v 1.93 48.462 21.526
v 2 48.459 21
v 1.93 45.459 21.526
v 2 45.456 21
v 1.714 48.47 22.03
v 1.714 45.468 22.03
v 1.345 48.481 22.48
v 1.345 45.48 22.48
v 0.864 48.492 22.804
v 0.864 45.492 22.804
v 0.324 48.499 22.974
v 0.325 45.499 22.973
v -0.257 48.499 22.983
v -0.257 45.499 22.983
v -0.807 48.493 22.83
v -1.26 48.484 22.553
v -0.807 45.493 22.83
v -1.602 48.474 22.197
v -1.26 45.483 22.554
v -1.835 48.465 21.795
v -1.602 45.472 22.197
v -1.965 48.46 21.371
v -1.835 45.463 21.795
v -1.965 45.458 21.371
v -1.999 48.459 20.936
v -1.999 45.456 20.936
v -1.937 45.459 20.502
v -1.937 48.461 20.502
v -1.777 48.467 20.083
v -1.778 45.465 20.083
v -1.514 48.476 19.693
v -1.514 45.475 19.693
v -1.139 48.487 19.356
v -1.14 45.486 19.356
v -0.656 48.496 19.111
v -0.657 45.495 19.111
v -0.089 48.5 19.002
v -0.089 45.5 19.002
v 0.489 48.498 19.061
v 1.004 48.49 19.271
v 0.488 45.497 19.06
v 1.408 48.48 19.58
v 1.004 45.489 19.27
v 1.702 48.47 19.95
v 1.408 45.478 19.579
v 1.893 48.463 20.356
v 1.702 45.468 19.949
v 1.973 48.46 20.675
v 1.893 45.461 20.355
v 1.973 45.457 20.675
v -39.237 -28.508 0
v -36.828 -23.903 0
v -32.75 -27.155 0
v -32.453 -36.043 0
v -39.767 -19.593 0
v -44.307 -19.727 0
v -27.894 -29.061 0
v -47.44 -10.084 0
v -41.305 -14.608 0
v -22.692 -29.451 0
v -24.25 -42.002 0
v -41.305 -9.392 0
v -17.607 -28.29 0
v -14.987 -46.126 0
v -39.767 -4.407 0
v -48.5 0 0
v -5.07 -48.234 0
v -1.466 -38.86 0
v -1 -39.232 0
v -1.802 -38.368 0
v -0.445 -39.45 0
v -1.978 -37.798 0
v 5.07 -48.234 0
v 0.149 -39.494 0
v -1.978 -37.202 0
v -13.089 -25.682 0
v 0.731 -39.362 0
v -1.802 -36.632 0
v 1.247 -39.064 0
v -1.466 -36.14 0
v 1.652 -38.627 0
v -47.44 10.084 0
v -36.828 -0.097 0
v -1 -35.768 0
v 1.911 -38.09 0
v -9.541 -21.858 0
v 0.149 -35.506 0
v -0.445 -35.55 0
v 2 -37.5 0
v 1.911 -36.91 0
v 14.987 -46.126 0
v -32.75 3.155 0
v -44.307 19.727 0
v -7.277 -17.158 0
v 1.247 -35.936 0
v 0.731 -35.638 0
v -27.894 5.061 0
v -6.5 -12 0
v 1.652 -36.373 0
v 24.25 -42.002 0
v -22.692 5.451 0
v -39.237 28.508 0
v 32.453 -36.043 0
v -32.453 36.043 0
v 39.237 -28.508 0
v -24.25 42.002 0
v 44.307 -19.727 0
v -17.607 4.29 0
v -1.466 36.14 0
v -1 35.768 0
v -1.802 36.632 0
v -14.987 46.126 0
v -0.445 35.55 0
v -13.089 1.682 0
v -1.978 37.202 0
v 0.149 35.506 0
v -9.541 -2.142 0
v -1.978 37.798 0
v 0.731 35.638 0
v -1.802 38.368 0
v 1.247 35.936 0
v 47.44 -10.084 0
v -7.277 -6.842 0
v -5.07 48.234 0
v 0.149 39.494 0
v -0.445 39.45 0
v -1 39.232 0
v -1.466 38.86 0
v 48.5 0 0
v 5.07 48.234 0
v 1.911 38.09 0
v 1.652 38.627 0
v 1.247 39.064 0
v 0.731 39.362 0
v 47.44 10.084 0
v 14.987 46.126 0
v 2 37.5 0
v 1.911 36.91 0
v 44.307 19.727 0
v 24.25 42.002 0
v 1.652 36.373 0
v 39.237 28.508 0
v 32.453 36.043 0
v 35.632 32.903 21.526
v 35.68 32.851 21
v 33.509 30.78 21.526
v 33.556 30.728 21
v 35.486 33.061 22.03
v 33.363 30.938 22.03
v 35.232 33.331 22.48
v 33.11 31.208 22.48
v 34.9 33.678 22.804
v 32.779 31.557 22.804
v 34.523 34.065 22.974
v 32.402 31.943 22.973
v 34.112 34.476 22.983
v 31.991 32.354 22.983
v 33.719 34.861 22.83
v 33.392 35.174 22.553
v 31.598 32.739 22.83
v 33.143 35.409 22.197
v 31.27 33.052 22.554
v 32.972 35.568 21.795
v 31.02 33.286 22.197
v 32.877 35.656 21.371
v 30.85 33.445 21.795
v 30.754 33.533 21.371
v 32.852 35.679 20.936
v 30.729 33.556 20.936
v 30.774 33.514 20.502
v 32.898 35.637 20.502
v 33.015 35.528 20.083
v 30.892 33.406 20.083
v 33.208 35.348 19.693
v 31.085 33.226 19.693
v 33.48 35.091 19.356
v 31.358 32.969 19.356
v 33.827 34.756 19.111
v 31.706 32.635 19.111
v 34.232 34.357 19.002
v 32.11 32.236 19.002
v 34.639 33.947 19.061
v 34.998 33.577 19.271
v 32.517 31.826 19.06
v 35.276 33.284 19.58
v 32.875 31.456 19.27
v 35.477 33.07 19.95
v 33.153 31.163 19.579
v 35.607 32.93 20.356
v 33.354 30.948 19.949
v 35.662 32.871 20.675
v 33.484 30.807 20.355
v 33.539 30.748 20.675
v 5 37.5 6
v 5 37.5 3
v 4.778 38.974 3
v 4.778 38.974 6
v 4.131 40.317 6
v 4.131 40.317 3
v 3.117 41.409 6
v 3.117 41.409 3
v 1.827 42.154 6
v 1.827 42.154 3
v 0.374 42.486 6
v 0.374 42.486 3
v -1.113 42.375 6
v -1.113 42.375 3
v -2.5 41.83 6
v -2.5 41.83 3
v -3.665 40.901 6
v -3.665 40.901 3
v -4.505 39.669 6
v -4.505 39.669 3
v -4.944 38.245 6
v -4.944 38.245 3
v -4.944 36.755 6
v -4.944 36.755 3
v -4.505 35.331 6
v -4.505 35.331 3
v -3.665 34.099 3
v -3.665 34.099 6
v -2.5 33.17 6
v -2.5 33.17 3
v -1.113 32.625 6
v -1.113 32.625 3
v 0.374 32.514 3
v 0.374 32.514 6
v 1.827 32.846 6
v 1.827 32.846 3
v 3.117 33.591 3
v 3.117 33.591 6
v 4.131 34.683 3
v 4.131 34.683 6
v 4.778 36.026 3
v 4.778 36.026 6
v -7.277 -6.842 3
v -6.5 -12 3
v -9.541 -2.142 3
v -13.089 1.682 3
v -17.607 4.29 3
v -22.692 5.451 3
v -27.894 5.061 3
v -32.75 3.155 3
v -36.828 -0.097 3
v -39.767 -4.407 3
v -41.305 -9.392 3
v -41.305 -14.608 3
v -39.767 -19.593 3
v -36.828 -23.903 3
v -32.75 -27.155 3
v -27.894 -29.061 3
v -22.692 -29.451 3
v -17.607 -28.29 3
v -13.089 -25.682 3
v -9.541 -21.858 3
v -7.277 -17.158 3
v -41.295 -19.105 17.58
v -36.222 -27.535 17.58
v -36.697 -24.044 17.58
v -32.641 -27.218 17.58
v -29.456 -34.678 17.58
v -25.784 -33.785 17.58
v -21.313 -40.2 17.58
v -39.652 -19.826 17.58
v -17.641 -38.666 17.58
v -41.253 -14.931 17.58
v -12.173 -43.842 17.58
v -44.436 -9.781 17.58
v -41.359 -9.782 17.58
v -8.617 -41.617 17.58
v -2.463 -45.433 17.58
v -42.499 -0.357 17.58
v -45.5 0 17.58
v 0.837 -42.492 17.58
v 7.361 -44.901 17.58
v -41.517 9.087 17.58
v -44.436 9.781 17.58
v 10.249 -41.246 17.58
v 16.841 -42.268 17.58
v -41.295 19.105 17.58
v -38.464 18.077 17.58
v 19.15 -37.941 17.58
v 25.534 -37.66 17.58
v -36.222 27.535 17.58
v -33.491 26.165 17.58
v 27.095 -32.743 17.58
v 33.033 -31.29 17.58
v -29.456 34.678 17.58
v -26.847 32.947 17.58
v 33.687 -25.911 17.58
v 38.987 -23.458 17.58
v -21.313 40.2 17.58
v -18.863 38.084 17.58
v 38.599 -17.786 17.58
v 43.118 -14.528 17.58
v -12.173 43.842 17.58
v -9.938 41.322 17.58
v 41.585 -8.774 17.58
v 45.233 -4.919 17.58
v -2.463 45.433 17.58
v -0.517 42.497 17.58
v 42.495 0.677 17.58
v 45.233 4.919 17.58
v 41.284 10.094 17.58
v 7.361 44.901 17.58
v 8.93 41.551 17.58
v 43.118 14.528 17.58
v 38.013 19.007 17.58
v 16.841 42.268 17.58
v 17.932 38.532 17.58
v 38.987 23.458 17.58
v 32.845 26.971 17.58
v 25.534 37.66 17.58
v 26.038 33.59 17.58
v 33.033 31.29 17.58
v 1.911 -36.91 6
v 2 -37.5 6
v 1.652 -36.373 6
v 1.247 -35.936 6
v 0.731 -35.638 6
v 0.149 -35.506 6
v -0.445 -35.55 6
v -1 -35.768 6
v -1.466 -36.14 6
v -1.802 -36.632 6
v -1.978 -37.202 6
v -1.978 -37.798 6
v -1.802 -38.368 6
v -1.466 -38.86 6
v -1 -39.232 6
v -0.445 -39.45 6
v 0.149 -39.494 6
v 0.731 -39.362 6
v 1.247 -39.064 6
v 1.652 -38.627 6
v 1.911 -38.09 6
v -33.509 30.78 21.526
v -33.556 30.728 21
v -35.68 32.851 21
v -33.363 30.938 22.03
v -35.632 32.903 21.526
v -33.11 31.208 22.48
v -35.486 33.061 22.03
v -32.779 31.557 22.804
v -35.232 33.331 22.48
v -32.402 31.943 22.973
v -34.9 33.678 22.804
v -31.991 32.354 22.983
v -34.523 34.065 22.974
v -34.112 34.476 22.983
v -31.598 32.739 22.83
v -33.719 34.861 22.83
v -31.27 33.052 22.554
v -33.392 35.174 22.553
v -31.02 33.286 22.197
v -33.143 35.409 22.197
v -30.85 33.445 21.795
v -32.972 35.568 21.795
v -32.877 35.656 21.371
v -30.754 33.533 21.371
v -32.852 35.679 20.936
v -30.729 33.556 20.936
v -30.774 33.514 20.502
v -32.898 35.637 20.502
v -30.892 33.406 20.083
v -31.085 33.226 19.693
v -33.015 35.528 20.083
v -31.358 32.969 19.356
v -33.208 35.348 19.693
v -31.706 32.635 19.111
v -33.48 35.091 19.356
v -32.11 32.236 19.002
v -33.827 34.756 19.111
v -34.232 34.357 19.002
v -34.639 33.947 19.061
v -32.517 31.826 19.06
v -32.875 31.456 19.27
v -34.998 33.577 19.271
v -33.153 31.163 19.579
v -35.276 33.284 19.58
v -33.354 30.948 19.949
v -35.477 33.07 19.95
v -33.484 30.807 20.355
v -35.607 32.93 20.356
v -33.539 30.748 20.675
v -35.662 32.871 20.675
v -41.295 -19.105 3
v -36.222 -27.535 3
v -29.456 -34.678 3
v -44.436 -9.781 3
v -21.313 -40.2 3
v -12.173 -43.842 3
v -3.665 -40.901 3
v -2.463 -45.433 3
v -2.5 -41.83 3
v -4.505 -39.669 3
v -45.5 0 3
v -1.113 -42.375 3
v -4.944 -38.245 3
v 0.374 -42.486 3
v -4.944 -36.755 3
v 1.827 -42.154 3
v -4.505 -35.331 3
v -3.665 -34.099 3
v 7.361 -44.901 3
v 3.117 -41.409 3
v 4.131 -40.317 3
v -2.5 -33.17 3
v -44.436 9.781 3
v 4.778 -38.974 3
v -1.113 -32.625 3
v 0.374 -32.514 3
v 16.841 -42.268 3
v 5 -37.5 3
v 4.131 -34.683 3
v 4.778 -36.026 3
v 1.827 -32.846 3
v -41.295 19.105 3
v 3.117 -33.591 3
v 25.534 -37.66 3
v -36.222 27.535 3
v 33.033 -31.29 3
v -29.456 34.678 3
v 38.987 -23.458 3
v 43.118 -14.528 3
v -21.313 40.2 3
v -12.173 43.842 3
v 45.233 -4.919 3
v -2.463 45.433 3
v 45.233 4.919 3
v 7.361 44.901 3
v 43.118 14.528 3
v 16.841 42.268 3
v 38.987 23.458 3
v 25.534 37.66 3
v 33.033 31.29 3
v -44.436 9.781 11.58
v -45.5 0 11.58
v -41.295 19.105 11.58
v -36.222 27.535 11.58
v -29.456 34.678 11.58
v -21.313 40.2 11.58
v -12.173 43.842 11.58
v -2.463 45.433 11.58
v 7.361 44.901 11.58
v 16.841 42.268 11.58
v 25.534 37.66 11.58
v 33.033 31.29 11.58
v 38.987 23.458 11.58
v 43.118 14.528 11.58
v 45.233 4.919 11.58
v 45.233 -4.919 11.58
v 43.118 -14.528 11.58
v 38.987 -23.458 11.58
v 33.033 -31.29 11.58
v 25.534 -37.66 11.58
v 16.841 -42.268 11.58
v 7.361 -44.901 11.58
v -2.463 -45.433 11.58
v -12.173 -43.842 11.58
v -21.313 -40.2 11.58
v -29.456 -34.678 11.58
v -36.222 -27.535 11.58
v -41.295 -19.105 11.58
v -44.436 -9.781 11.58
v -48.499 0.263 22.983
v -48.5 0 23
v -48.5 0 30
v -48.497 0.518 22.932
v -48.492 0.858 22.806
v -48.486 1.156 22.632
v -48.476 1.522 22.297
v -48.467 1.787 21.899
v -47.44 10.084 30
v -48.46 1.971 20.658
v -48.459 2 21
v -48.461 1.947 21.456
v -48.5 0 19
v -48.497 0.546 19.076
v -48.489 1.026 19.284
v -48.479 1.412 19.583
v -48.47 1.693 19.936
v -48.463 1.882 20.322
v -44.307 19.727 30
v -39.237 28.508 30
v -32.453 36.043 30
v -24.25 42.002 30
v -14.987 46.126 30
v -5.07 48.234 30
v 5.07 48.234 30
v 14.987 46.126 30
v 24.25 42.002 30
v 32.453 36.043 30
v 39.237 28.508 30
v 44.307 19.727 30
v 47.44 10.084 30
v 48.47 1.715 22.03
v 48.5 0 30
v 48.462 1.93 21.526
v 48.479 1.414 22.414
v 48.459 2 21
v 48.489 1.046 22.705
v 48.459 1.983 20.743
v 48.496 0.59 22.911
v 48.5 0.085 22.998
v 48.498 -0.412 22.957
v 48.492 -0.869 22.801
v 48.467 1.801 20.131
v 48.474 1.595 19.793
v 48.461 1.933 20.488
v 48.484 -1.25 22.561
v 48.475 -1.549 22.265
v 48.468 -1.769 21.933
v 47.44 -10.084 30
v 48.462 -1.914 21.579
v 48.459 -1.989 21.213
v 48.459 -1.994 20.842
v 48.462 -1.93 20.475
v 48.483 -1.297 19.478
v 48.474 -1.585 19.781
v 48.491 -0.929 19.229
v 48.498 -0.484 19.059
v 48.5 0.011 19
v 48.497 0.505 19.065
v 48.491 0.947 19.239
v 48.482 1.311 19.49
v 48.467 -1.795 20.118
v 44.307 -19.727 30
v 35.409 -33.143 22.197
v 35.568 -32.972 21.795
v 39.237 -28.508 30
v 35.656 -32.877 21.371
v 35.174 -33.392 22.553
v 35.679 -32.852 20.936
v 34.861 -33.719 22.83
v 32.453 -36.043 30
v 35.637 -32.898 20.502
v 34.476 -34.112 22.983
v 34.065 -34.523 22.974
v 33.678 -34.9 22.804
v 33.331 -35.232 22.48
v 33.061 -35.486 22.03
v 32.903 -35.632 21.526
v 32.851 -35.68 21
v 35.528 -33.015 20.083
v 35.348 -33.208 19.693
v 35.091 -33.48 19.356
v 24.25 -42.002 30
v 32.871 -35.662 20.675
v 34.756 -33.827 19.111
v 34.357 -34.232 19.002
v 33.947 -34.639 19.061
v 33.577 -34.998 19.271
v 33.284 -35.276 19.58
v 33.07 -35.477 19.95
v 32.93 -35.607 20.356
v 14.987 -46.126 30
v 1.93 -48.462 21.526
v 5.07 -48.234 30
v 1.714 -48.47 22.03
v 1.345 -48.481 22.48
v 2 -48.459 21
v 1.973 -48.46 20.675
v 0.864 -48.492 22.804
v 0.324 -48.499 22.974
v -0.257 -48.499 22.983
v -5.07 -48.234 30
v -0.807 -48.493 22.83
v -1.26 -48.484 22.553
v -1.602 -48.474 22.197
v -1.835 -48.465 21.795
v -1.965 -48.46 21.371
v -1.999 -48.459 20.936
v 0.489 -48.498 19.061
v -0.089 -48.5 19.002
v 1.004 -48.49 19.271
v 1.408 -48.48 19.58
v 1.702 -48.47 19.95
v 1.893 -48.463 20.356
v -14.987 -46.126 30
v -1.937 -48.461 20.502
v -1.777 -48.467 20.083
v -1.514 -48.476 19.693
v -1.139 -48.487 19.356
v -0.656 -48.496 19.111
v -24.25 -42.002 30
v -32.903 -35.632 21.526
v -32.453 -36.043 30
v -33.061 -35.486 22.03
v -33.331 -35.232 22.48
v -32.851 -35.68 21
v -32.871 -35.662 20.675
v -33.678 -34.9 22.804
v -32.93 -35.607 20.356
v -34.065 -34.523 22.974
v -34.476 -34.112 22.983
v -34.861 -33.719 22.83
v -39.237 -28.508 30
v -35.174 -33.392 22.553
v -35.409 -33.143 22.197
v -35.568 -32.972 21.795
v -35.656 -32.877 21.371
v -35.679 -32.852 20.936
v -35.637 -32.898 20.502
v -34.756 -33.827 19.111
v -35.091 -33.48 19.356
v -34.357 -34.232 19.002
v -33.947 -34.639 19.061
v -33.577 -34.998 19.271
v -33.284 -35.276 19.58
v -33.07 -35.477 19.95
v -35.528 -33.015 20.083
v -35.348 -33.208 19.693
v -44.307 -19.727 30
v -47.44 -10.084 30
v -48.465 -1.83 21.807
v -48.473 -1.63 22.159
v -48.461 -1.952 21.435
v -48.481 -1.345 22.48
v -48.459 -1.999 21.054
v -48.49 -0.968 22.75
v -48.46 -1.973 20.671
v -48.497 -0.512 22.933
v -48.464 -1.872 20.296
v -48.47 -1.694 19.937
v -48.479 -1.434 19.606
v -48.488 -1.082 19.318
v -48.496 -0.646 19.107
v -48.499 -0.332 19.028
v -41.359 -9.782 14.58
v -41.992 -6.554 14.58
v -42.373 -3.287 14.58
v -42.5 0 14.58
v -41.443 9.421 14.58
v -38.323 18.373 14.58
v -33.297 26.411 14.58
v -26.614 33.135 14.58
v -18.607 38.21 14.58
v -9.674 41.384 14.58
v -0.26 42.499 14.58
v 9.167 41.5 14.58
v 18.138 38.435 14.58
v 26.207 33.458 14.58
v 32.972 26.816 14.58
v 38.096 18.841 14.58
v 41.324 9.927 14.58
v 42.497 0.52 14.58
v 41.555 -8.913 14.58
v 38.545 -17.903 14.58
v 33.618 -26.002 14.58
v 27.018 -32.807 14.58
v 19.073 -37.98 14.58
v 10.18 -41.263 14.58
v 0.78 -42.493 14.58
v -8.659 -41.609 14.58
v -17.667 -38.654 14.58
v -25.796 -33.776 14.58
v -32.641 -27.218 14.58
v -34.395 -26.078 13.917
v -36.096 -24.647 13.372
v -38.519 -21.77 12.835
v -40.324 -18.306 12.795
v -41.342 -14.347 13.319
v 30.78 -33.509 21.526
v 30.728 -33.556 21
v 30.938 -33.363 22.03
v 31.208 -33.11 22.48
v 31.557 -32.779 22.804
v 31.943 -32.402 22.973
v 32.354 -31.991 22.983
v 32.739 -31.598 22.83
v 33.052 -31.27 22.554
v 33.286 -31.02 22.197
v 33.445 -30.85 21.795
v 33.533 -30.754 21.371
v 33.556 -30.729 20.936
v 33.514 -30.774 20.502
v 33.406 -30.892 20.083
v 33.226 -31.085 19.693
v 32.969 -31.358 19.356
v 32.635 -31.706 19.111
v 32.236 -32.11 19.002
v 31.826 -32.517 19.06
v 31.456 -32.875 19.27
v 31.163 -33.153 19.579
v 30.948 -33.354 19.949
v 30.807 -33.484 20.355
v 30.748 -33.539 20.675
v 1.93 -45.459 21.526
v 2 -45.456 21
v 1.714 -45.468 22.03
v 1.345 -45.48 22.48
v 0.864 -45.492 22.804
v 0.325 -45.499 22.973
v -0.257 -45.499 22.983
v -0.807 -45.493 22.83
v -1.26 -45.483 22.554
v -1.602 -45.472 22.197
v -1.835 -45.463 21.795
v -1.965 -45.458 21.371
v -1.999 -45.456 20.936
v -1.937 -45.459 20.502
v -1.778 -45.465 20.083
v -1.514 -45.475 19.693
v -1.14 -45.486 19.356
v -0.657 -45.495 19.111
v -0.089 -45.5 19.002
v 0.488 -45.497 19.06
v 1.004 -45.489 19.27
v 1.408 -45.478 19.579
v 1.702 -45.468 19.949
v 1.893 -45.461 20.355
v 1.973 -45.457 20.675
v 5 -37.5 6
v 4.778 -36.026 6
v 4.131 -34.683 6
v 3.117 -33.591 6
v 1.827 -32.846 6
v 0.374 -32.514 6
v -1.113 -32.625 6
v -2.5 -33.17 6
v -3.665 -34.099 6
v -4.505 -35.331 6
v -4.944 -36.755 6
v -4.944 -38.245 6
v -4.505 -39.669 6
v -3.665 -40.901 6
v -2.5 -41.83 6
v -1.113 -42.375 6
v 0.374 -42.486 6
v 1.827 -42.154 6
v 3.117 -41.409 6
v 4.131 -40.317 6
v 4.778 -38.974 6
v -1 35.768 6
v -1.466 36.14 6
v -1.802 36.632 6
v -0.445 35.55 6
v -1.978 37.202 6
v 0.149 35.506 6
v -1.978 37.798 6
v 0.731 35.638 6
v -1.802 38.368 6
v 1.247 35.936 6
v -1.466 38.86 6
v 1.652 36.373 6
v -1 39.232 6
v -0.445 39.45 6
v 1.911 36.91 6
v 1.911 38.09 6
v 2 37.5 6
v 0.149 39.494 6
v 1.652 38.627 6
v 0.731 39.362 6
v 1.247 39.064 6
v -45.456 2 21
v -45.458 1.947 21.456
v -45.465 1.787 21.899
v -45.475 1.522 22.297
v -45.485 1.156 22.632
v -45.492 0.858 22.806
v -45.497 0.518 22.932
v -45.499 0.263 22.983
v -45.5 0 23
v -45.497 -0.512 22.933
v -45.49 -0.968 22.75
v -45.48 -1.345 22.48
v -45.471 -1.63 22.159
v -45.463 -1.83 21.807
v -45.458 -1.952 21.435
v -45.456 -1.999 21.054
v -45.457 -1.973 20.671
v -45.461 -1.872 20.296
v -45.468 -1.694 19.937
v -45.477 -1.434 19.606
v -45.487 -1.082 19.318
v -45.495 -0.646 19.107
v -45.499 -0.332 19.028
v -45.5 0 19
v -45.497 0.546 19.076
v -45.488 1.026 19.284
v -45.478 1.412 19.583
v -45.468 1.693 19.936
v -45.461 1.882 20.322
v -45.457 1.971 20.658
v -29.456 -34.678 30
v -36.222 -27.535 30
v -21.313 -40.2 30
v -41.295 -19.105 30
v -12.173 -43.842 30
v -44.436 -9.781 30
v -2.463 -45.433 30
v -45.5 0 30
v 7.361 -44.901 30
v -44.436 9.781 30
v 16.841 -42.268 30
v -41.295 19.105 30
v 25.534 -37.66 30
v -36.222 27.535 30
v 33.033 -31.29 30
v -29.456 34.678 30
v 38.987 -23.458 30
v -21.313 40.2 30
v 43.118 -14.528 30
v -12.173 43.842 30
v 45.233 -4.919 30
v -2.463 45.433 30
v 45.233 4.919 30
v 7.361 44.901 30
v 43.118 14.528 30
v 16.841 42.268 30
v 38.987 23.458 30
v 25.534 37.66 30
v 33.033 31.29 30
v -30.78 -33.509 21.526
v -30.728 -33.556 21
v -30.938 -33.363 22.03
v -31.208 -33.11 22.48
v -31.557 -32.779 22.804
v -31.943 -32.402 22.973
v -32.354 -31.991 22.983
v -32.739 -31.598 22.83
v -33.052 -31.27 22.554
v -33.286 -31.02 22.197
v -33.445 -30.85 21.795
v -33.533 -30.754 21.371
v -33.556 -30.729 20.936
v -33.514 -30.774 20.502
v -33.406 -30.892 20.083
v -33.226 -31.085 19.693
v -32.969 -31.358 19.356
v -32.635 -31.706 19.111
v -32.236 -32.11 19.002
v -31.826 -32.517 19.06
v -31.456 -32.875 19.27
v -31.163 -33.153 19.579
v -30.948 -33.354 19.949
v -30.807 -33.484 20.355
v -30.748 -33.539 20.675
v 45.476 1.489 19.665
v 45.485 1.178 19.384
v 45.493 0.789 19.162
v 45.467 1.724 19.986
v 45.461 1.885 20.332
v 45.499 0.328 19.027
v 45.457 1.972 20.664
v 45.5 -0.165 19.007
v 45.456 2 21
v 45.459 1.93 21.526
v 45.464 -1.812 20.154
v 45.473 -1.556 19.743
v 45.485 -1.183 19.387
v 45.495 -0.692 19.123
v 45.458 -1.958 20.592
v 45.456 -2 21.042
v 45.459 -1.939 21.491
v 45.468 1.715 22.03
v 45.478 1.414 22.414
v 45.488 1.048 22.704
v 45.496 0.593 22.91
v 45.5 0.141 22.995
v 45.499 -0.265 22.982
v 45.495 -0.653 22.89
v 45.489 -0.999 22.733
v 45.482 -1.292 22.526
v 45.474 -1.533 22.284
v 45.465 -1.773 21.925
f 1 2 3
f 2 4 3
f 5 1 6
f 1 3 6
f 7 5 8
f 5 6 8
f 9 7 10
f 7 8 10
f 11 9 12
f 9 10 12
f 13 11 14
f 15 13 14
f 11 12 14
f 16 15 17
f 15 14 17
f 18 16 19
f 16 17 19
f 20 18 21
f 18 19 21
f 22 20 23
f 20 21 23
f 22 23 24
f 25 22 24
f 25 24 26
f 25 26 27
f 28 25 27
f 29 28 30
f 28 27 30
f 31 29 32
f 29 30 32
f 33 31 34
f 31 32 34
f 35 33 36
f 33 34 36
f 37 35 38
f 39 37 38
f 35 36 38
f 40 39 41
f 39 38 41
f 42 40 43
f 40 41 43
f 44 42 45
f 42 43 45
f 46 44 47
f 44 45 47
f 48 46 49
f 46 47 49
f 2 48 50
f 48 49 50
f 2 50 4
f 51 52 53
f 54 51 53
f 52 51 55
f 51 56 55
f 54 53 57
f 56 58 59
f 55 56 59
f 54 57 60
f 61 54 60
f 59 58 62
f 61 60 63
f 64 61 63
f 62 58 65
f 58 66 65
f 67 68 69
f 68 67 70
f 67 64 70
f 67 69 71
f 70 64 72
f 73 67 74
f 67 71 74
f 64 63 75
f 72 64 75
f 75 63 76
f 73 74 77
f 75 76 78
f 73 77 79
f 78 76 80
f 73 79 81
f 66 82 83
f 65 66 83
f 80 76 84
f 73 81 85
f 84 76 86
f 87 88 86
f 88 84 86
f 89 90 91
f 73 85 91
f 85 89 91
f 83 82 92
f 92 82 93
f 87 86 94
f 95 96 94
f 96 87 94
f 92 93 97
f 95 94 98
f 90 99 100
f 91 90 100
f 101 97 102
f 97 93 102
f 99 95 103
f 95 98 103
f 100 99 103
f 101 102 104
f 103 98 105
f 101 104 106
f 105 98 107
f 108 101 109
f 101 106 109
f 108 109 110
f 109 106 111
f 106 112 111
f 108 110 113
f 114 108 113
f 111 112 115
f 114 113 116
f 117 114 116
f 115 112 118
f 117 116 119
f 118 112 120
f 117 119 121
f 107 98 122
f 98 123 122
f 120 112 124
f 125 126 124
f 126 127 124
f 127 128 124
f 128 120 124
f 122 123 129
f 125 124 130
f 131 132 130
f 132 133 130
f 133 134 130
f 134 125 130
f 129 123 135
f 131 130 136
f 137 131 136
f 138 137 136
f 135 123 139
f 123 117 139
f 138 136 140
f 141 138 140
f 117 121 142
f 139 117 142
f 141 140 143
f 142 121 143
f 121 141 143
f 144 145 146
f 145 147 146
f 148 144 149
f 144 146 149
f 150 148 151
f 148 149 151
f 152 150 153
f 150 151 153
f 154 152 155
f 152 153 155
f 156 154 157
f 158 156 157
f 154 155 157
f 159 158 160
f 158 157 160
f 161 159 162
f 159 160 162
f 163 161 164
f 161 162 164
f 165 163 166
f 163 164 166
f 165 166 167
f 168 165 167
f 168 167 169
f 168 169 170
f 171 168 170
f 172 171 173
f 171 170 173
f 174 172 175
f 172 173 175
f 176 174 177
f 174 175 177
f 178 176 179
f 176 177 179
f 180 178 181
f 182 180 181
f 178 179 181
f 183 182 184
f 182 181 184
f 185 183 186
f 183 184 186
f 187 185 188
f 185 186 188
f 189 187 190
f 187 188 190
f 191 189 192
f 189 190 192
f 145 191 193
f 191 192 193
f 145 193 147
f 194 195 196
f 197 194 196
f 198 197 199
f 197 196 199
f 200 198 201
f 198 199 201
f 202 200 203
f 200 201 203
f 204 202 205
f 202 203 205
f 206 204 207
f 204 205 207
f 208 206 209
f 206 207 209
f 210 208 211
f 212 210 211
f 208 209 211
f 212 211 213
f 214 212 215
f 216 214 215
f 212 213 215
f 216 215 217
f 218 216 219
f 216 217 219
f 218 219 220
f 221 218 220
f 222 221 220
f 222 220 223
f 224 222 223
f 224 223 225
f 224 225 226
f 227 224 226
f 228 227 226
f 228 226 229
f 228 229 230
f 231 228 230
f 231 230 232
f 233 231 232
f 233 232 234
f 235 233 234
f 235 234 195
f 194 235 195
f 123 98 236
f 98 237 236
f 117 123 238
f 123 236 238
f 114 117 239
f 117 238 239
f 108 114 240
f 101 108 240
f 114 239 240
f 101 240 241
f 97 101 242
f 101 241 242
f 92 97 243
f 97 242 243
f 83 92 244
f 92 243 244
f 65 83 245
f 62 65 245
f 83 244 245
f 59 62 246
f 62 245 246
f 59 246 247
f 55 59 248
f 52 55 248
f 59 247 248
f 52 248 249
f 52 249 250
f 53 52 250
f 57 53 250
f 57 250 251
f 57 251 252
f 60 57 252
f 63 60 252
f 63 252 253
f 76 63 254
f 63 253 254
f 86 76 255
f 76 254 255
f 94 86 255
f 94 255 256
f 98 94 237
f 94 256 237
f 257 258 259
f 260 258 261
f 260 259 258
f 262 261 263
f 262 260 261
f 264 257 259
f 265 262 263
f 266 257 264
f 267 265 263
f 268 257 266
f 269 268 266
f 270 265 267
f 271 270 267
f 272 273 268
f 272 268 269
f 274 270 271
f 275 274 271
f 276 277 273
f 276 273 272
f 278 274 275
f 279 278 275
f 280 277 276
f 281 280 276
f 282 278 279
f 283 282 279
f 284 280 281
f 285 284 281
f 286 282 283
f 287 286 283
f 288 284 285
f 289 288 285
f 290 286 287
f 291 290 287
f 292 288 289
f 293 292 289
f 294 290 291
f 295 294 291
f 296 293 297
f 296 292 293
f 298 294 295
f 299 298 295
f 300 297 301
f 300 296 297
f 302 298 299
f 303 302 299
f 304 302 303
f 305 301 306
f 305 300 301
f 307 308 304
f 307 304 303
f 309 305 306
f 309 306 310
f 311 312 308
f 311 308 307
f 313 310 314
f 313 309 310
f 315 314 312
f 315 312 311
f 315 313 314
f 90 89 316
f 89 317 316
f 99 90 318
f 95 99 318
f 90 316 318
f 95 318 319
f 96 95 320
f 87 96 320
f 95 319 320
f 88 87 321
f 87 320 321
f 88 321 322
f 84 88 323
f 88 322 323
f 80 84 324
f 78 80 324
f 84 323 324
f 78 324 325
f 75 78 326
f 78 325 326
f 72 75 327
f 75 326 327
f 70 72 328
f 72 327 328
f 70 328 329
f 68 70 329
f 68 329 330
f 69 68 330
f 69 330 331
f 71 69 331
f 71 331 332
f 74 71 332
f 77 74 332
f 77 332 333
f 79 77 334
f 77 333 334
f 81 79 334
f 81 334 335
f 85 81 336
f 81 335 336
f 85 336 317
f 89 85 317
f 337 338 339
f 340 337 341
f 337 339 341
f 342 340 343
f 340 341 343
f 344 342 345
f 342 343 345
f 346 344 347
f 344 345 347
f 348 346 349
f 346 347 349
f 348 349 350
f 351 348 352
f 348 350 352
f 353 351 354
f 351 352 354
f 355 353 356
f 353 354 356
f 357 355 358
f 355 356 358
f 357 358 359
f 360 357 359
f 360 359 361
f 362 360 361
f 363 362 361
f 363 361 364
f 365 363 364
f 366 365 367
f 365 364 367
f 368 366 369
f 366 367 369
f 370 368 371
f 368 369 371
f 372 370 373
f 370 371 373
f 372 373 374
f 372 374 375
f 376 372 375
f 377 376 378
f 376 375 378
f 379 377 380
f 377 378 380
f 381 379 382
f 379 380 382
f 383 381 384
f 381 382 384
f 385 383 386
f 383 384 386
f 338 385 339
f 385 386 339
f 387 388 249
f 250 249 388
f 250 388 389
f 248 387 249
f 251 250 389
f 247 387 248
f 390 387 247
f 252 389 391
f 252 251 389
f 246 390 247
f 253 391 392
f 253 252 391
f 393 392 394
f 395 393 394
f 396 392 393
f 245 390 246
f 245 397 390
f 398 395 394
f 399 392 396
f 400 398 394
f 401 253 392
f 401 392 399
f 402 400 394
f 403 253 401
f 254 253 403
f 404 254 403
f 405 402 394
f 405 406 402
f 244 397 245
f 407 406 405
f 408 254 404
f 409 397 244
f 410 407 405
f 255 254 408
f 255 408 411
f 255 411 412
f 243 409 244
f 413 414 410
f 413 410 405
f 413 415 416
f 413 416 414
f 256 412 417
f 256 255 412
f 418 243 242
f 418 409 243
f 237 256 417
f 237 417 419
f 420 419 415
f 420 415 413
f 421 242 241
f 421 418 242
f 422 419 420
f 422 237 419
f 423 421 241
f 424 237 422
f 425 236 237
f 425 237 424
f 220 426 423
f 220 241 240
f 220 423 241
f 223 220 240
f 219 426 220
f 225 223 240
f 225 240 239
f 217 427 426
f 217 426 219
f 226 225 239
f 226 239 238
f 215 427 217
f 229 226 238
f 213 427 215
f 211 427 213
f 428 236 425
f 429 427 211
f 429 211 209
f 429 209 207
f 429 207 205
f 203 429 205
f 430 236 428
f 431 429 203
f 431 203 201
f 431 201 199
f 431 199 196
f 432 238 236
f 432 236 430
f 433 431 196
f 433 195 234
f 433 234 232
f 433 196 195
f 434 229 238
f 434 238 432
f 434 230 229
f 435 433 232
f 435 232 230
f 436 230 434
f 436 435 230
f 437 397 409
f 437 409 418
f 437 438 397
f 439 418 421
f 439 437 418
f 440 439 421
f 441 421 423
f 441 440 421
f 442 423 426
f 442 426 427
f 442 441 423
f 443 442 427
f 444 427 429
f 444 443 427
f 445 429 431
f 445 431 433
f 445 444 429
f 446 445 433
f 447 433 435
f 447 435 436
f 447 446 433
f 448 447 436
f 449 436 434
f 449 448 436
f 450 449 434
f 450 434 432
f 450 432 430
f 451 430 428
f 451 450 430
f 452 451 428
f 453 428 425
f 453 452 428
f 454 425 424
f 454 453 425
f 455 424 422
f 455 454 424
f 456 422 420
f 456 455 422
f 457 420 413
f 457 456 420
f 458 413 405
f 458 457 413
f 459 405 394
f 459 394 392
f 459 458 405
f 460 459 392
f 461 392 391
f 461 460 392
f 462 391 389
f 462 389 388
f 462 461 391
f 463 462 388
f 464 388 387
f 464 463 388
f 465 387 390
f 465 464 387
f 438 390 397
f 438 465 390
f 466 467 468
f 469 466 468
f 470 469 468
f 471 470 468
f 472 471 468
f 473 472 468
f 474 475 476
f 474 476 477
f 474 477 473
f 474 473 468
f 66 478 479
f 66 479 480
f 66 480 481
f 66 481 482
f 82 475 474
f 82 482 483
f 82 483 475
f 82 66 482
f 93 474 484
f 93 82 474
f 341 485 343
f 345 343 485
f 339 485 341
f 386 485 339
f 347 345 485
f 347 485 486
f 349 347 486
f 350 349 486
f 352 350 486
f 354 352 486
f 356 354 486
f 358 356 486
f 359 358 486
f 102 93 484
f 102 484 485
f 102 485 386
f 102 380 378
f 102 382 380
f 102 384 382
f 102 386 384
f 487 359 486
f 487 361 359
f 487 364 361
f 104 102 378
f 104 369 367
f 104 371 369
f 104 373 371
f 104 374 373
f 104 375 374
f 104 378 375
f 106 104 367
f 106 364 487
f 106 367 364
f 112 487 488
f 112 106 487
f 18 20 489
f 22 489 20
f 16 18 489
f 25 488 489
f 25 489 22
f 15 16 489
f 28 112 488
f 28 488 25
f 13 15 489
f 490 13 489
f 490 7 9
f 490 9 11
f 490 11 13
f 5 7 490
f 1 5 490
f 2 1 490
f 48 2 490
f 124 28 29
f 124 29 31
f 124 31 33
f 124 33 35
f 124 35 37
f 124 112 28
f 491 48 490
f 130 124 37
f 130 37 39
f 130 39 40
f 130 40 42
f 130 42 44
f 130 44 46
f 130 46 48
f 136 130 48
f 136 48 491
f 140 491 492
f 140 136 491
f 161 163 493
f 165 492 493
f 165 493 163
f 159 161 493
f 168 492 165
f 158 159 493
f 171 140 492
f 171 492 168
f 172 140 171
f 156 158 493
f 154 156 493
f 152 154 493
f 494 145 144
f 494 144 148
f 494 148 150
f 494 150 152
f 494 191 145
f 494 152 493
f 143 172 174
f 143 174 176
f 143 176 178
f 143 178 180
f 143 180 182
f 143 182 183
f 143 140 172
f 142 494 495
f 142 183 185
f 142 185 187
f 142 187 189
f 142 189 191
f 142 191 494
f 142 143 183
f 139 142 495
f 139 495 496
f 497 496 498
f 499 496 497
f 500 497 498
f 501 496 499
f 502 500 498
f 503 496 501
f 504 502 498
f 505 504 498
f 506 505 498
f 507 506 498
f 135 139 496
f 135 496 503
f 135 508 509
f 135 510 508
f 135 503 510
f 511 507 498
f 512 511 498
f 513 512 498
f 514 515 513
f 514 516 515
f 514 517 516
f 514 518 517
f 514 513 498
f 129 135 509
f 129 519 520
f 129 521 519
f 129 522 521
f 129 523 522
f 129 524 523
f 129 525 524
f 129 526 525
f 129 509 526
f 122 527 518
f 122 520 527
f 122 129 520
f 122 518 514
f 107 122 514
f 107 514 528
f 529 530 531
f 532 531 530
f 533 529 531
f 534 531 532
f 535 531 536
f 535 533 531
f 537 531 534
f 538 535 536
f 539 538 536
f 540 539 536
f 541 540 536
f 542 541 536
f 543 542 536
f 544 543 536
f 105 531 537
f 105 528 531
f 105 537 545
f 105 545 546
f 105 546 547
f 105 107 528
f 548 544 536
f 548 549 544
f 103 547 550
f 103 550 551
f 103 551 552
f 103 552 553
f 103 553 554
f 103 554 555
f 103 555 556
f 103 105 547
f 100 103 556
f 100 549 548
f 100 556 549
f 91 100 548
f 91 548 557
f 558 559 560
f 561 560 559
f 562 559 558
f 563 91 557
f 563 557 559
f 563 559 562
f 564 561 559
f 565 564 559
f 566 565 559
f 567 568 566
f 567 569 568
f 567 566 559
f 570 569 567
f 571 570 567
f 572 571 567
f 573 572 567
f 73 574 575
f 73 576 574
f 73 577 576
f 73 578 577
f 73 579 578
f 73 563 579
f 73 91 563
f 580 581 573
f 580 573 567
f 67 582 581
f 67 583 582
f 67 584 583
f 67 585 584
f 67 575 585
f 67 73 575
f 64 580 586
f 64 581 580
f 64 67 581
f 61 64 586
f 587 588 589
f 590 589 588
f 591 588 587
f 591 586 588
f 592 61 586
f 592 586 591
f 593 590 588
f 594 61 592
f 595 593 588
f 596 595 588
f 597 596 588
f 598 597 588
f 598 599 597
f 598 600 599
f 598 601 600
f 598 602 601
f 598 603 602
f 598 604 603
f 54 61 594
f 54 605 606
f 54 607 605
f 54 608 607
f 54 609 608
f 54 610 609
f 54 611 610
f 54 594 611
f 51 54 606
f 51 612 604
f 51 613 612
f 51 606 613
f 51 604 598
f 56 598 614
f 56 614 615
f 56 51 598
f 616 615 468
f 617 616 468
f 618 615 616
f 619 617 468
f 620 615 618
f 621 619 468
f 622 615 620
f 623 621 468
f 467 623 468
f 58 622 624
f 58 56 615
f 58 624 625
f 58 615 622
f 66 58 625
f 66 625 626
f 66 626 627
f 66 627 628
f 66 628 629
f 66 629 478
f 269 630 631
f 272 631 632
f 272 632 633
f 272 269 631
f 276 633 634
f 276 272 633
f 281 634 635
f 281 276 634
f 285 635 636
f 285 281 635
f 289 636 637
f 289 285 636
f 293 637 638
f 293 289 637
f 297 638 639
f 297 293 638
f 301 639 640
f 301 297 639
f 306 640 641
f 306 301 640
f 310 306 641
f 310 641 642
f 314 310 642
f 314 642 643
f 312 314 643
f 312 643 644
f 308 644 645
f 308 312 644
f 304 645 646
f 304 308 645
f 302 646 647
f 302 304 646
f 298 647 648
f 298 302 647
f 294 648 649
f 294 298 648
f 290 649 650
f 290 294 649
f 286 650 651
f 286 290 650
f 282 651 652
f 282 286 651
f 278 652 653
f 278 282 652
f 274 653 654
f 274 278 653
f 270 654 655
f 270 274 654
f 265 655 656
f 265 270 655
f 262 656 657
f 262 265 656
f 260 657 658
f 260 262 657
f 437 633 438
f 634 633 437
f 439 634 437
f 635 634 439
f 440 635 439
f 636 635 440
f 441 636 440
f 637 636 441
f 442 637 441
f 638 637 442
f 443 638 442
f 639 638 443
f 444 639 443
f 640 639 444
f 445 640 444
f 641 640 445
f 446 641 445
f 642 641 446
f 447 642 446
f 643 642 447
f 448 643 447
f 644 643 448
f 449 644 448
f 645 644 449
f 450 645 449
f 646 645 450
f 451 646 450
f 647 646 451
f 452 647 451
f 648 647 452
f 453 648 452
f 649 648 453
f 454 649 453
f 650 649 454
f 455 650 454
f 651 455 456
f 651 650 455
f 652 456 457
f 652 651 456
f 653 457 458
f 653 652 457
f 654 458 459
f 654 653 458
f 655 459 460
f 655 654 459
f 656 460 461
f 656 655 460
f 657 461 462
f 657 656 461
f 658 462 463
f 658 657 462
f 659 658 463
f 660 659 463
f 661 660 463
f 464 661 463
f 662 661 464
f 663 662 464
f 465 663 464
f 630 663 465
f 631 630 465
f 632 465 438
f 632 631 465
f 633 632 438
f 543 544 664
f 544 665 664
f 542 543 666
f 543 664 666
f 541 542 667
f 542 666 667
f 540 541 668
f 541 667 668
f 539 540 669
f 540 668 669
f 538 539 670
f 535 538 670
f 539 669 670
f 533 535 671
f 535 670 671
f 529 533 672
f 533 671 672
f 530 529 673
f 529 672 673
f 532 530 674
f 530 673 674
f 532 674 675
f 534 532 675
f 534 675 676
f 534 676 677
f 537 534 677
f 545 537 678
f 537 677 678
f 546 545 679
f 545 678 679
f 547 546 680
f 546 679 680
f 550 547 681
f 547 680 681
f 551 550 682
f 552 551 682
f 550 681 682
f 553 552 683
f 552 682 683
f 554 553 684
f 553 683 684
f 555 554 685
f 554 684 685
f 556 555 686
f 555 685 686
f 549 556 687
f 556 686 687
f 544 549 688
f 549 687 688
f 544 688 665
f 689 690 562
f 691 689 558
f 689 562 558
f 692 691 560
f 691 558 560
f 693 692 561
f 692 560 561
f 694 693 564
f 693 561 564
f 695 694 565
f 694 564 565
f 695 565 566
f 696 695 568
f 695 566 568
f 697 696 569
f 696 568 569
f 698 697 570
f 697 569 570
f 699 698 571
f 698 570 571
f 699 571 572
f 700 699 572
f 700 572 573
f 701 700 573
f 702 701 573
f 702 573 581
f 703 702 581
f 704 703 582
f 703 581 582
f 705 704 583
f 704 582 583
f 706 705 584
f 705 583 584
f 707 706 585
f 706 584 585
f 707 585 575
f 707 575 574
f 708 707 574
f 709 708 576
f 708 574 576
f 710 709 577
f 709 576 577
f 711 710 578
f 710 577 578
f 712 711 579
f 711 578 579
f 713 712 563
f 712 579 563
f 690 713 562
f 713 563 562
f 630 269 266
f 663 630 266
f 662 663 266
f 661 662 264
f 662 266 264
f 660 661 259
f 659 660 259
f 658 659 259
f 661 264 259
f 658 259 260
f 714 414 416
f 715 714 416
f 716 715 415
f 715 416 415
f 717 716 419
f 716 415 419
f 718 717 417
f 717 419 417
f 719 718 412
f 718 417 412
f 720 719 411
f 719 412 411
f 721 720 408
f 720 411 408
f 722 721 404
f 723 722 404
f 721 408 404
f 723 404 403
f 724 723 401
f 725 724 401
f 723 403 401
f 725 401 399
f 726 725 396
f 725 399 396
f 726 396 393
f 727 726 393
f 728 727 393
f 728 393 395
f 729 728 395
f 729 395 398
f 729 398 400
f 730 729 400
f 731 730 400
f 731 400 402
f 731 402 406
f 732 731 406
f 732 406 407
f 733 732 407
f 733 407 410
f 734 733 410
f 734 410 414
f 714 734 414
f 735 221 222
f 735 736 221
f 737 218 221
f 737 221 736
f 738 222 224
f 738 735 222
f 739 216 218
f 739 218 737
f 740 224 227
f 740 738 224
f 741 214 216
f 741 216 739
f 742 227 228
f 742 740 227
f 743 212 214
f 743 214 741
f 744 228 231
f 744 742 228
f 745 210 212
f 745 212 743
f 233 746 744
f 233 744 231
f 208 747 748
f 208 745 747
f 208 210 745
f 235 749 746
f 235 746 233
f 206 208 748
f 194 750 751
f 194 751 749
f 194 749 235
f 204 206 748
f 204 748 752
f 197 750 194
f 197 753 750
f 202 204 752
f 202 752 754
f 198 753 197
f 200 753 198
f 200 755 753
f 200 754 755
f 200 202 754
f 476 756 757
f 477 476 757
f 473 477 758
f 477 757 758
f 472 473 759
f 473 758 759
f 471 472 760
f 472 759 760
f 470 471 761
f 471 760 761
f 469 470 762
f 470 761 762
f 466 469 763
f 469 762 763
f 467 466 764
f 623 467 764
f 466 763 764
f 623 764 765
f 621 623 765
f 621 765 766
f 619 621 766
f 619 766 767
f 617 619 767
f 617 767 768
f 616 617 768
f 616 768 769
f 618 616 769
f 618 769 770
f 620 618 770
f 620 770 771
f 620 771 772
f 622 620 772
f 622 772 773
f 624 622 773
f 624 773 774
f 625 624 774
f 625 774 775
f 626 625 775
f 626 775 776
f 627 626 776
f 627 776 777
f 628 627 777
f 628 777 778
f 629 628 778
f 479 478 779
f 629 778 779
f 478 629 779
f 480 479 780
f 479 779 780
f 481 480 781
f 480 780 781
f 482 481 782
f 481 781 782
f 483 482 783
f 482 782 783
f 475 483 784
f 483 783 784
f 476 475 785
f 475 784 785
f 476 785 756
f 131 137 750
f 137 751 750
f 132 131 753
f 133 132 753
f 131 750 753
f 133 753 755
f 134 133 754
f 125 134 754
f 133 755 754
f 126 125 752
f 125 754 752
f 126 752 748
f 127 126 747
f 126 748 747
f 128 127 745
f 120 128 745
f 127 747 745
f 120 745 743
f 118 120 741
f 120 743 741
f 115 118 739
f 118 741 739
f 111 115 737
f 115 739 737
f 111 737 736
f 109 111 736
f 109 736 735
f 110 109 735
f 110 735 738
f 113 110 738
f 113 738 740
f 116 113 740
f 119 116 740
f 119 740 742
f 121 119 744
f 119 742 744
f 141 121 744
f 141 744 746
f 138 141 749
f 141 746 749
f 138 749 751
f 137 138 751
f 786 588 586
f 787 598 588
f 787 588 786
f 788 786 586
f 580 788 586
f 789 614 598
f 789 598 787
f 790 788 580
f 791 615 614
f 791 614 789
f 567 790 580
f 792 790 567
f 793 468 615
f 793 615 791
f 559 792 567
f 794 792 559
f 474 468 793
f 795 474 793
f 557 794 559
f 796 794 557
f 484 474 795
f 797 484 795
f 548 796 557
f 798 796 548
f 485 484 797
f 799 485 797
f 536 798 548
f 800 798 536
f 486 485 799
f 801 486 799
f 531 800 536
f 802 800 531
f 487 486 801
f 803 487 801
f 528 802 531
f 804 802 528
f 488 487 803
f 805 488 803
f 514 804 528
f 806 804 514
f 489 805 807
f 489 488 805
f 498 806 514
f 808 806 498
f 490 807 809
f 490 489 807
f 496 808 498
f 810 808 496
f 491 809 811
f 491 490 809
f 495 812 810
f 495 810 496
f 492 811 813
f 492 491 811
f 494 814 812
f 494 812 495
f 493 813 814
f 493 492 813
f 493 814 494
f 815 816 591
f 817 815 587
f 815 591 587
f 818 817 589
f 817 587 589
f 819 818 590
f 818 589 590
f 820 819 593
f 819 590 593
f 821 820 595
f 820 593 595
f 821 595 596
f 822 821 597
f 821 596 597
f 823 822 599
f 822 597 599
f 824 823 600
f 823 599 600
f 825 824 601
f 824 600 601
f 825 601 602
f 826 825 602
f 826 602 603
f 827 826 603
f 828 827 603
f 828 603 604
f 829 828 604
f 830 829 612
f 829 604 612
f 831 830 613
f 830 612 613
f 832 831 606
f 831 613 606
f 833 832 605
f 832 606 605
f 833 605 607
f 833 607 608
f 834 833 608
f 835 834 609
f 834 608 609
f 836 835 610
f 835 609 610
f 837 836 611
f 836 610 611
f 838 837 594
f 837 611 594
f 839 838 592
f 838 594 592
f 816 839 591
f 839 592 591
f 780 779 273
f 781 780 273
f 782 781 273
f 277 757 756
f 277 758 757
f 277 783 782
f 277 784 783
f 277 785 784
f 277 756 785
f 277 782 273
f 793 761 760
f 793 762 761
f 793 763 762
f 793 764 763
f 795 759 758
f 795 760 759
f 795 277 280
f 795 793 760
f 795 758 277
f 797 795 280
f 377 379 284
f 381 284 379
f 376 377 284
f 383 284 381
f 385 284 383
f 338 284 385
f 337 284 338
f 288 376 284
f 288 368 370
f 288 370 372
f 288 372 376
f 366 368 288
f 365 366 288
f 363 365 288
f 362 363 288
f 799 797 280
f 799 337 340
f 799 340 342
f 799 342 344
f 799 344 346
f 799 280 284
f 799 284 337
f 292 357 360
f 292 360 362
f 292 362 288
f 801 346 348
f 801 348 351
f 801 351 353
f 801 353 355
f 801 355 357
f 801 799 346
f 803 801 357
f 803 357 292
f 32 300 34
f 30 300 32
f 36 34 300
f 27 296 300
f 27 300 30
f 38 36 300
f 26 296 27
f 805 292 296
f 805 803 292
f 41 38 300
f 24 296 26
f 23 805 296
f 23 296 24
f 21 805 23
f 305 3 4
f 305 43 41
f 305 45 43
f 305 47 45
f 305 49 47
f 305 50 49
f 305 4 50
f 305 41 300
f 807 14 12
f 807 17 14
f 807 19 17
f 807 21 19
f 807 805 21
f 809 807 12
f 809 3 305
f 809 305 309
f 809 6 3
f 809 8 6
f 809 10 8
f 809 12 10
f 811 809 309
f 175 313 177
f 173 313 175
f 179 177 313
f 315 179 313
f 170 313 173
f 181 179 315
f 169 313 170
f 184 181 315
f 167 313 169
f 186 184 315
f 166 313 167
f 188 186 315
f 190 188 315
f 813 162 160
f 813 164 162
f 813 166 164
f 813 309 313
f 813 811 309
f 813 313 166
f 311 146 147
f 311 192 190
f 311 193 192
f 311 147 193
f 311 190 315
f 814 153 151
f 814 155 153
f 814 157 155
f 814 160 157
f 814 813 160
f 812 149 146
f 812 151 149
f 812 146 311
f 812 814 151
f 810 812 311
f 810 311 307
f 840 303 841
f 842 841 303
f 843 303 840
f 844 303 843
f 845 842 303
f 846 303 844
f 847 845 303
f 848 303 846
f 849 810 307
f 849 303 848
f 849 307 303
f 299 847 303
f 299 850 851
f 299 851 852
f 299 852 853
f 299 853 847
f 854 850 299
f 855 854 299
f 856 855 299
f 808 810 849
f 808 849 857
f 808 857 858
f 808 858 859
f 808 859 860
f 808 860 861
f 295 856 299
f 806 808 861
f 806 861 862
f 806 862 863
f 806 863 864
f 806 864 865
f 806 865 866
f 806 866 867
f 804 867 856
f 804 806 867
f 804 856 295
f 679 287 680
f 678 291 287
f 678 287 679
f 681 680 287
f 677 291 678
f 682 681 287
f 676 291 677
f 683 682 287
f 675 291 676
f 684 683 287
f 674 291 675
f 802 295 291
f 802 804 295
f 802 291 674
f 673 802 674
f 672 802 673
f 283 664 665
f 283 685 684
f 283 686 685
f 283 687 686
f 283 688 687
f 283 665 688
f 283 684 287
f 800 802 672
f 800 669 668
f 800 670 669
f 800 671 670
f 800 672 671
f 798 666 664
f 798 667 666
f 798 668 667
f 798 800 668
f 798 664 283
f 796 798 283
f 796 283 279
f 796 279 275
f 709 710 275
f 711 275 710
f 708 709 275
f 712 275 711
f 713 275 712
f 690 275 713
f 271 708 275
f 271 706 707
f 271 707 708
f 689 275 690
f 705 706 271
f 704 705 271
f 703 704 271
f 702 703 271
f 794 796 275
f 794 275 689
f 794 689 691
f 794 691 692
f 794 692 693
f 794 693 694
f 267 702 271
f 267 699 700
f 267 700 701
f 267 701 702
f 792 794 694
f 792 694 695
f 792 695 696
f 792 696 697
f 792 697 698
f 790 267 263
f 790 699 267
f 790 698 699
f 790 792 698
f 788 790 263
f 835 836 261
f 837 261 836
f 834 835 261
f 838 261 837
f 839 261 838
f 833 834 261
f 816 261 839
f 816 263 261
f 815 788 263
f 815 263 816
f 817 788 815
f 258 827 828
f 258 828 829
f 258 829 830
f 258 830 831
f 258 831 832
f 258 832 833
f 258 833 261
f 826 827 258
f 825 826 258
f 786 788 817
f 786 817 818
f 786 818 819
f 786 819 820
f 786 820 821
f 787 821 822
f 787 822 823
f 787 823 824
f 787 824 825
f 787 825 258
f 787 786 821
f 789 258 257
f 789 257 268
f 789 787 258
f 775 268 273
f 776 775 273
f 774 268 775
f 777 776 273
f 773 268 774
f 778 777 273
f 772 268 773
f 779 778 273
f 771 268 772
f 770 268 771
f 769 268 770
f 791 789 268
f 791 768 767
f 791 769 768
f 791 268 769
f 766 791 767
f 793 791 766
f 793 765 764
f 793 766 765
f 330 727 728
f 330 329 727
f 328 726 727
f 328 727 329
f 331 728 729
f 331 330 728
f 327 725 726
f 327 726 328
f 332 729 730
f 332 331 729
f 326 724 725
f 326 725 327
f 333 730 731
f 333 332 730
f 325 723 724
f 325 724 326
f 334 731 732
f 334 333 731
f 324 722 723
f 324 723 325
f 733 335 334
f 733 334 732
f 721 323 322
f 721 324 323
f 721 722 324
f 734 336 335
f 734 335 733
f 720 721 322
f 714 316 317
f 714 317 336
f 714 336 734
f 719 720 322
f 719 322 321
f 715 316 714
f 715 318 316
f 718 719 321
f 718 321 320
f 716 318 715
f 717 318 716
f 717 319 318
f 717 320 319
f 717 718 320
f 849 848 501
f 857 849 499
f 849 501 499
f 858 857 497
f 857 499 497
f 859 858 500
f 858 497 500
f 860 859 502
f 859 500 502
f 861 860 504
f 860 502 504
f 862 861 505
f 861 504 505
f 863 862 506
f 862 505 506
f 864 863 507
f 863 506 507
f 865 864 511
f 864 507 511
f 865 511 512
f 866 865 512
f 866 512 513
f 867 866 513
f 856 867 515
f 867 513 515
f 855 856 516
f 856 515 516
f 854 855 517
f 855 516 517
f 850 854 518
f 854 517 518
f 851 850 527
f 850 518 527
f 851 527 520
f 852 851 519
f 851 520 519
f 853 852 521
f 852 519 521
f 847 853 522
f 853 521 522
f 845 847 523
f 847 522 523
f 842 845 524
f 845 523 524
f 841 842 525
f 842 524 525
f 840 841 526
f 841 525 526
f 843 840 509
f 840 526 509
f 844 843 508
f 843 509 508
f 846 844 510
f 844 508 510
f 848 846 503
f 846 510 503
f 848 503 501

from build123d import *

# Parameters (mm, degrees)
F2_R      = 2
F3_DEPTH  = 77.8
F4_R      = 5
F5_DEPTH  = 6
F6_R      = 2
F7_DEPTH  = 12.5
F8_DEPTH  = 12.5
F9_R      = 2
F10_DEPTH = 50
F11_R     = 17.5
F12_DEPTH = 25
F14_R     = 2
F15_DEPTH = 50
F17_R     = 2
F18_DEPTH = 50


with BuildPart() as f1:
    # F0 (on Front) → F1 (revolve)
    with BuildSketch(Plane.XZ):
        Polygon((-48.5, 0), (0, 0), (0, 3), (-45.5, 3), (-45.5, 11.58), (-45.5, 17.58), (-45.5, 30), (-48.5, 30), align=None)
        Polygon((-45.5, 17.58), (-45.5, 11.58), (-42.5, 14.58), (-42.5, 17.58), align=None)
    revolve(axis=Axis((0, 0, 1.5), (0, 0, -1)))

    # F2 (on Front) → F3 (cut, symmetric)
    with BuildSketch(Plane.XZ):
        with Locations((0, 21)):
            Circle(F2_R)
    extrude(amount=F3_DEPTH, both=True, mode=Mode.SUBTRACT)

    # F4 (on Top) → F5 (join)
    with BuildSketch(Plane.XY):
        with Locations((0, -37.5)):
            Circle(F4_R)
        with Locations((0, 37.5)):
            Circle(F4_R)
    extrude(amount=F5_DEPTH)

    # F6 (on face) → F7 (cut, symmetric)
    with BuildSketch(Plane.XY.offset(3)):
        with Locations((0, 37.5)):
            Circle(F6_R)
    extrude(amount=F7_DEPTH, both=True, mode=Mode.SUBTRACT)

    # F6 (on face) → F8 (cut, symmetric)
    with BuildSketch(Plane.XY.offset(3)):
        with Locations((0, -37.5)):
            Circle(F6_R)
    extrude(amount=F8_DEPTH, both=True, mode=Mode.SUBTRACT)

    # F9 (on Right) → F10 (cut, symmetric)
    with BuildSketch(Plane.YZ):
        with Locations((0, 21)):
            Circle(F9_R)
    extrude(amount=F10_DEPTH, both=True, mode=Mode.SUBTRACT)

    # F11 (on face) → F12 (cut, symmetric)
    with BuildSketch(Plane.XY.offset(3)):
        with Locations((-24, -12)):
            Circle(F11_R)
    extrude(amount=F12_DEPTH, both=True, mode=Mode.SUBTRACT)

    # F14 (on face) → F15 (cut, symmetric)
    with BuildSketch(Plane(origin=(0, 0, 0), x_dir=(0.707107, -0.707107, 0), z_dir=(-0.707107, -0.707107, 0))):
        with Locations((0, 21)):
            Circle(F14_R)
    extrude(amount=F15_DEPTH, both=True, mode=Mode.SUBTRACT)

    # F17 (on face) → F18 (cut, symmetric)
    with BuildSketch(Plane(origin=(0, 0, 0), x_dir=(-0.707107, -0.707107, 0), z_dir=(-0.707107, 0.707107, 0))):
        with Locations((0, 21)):
            Circle(F17_R)
    extrude(amount=F18_DEPTH, both=True, mode=Mode.SUBTRACT)


solid = f1.part
